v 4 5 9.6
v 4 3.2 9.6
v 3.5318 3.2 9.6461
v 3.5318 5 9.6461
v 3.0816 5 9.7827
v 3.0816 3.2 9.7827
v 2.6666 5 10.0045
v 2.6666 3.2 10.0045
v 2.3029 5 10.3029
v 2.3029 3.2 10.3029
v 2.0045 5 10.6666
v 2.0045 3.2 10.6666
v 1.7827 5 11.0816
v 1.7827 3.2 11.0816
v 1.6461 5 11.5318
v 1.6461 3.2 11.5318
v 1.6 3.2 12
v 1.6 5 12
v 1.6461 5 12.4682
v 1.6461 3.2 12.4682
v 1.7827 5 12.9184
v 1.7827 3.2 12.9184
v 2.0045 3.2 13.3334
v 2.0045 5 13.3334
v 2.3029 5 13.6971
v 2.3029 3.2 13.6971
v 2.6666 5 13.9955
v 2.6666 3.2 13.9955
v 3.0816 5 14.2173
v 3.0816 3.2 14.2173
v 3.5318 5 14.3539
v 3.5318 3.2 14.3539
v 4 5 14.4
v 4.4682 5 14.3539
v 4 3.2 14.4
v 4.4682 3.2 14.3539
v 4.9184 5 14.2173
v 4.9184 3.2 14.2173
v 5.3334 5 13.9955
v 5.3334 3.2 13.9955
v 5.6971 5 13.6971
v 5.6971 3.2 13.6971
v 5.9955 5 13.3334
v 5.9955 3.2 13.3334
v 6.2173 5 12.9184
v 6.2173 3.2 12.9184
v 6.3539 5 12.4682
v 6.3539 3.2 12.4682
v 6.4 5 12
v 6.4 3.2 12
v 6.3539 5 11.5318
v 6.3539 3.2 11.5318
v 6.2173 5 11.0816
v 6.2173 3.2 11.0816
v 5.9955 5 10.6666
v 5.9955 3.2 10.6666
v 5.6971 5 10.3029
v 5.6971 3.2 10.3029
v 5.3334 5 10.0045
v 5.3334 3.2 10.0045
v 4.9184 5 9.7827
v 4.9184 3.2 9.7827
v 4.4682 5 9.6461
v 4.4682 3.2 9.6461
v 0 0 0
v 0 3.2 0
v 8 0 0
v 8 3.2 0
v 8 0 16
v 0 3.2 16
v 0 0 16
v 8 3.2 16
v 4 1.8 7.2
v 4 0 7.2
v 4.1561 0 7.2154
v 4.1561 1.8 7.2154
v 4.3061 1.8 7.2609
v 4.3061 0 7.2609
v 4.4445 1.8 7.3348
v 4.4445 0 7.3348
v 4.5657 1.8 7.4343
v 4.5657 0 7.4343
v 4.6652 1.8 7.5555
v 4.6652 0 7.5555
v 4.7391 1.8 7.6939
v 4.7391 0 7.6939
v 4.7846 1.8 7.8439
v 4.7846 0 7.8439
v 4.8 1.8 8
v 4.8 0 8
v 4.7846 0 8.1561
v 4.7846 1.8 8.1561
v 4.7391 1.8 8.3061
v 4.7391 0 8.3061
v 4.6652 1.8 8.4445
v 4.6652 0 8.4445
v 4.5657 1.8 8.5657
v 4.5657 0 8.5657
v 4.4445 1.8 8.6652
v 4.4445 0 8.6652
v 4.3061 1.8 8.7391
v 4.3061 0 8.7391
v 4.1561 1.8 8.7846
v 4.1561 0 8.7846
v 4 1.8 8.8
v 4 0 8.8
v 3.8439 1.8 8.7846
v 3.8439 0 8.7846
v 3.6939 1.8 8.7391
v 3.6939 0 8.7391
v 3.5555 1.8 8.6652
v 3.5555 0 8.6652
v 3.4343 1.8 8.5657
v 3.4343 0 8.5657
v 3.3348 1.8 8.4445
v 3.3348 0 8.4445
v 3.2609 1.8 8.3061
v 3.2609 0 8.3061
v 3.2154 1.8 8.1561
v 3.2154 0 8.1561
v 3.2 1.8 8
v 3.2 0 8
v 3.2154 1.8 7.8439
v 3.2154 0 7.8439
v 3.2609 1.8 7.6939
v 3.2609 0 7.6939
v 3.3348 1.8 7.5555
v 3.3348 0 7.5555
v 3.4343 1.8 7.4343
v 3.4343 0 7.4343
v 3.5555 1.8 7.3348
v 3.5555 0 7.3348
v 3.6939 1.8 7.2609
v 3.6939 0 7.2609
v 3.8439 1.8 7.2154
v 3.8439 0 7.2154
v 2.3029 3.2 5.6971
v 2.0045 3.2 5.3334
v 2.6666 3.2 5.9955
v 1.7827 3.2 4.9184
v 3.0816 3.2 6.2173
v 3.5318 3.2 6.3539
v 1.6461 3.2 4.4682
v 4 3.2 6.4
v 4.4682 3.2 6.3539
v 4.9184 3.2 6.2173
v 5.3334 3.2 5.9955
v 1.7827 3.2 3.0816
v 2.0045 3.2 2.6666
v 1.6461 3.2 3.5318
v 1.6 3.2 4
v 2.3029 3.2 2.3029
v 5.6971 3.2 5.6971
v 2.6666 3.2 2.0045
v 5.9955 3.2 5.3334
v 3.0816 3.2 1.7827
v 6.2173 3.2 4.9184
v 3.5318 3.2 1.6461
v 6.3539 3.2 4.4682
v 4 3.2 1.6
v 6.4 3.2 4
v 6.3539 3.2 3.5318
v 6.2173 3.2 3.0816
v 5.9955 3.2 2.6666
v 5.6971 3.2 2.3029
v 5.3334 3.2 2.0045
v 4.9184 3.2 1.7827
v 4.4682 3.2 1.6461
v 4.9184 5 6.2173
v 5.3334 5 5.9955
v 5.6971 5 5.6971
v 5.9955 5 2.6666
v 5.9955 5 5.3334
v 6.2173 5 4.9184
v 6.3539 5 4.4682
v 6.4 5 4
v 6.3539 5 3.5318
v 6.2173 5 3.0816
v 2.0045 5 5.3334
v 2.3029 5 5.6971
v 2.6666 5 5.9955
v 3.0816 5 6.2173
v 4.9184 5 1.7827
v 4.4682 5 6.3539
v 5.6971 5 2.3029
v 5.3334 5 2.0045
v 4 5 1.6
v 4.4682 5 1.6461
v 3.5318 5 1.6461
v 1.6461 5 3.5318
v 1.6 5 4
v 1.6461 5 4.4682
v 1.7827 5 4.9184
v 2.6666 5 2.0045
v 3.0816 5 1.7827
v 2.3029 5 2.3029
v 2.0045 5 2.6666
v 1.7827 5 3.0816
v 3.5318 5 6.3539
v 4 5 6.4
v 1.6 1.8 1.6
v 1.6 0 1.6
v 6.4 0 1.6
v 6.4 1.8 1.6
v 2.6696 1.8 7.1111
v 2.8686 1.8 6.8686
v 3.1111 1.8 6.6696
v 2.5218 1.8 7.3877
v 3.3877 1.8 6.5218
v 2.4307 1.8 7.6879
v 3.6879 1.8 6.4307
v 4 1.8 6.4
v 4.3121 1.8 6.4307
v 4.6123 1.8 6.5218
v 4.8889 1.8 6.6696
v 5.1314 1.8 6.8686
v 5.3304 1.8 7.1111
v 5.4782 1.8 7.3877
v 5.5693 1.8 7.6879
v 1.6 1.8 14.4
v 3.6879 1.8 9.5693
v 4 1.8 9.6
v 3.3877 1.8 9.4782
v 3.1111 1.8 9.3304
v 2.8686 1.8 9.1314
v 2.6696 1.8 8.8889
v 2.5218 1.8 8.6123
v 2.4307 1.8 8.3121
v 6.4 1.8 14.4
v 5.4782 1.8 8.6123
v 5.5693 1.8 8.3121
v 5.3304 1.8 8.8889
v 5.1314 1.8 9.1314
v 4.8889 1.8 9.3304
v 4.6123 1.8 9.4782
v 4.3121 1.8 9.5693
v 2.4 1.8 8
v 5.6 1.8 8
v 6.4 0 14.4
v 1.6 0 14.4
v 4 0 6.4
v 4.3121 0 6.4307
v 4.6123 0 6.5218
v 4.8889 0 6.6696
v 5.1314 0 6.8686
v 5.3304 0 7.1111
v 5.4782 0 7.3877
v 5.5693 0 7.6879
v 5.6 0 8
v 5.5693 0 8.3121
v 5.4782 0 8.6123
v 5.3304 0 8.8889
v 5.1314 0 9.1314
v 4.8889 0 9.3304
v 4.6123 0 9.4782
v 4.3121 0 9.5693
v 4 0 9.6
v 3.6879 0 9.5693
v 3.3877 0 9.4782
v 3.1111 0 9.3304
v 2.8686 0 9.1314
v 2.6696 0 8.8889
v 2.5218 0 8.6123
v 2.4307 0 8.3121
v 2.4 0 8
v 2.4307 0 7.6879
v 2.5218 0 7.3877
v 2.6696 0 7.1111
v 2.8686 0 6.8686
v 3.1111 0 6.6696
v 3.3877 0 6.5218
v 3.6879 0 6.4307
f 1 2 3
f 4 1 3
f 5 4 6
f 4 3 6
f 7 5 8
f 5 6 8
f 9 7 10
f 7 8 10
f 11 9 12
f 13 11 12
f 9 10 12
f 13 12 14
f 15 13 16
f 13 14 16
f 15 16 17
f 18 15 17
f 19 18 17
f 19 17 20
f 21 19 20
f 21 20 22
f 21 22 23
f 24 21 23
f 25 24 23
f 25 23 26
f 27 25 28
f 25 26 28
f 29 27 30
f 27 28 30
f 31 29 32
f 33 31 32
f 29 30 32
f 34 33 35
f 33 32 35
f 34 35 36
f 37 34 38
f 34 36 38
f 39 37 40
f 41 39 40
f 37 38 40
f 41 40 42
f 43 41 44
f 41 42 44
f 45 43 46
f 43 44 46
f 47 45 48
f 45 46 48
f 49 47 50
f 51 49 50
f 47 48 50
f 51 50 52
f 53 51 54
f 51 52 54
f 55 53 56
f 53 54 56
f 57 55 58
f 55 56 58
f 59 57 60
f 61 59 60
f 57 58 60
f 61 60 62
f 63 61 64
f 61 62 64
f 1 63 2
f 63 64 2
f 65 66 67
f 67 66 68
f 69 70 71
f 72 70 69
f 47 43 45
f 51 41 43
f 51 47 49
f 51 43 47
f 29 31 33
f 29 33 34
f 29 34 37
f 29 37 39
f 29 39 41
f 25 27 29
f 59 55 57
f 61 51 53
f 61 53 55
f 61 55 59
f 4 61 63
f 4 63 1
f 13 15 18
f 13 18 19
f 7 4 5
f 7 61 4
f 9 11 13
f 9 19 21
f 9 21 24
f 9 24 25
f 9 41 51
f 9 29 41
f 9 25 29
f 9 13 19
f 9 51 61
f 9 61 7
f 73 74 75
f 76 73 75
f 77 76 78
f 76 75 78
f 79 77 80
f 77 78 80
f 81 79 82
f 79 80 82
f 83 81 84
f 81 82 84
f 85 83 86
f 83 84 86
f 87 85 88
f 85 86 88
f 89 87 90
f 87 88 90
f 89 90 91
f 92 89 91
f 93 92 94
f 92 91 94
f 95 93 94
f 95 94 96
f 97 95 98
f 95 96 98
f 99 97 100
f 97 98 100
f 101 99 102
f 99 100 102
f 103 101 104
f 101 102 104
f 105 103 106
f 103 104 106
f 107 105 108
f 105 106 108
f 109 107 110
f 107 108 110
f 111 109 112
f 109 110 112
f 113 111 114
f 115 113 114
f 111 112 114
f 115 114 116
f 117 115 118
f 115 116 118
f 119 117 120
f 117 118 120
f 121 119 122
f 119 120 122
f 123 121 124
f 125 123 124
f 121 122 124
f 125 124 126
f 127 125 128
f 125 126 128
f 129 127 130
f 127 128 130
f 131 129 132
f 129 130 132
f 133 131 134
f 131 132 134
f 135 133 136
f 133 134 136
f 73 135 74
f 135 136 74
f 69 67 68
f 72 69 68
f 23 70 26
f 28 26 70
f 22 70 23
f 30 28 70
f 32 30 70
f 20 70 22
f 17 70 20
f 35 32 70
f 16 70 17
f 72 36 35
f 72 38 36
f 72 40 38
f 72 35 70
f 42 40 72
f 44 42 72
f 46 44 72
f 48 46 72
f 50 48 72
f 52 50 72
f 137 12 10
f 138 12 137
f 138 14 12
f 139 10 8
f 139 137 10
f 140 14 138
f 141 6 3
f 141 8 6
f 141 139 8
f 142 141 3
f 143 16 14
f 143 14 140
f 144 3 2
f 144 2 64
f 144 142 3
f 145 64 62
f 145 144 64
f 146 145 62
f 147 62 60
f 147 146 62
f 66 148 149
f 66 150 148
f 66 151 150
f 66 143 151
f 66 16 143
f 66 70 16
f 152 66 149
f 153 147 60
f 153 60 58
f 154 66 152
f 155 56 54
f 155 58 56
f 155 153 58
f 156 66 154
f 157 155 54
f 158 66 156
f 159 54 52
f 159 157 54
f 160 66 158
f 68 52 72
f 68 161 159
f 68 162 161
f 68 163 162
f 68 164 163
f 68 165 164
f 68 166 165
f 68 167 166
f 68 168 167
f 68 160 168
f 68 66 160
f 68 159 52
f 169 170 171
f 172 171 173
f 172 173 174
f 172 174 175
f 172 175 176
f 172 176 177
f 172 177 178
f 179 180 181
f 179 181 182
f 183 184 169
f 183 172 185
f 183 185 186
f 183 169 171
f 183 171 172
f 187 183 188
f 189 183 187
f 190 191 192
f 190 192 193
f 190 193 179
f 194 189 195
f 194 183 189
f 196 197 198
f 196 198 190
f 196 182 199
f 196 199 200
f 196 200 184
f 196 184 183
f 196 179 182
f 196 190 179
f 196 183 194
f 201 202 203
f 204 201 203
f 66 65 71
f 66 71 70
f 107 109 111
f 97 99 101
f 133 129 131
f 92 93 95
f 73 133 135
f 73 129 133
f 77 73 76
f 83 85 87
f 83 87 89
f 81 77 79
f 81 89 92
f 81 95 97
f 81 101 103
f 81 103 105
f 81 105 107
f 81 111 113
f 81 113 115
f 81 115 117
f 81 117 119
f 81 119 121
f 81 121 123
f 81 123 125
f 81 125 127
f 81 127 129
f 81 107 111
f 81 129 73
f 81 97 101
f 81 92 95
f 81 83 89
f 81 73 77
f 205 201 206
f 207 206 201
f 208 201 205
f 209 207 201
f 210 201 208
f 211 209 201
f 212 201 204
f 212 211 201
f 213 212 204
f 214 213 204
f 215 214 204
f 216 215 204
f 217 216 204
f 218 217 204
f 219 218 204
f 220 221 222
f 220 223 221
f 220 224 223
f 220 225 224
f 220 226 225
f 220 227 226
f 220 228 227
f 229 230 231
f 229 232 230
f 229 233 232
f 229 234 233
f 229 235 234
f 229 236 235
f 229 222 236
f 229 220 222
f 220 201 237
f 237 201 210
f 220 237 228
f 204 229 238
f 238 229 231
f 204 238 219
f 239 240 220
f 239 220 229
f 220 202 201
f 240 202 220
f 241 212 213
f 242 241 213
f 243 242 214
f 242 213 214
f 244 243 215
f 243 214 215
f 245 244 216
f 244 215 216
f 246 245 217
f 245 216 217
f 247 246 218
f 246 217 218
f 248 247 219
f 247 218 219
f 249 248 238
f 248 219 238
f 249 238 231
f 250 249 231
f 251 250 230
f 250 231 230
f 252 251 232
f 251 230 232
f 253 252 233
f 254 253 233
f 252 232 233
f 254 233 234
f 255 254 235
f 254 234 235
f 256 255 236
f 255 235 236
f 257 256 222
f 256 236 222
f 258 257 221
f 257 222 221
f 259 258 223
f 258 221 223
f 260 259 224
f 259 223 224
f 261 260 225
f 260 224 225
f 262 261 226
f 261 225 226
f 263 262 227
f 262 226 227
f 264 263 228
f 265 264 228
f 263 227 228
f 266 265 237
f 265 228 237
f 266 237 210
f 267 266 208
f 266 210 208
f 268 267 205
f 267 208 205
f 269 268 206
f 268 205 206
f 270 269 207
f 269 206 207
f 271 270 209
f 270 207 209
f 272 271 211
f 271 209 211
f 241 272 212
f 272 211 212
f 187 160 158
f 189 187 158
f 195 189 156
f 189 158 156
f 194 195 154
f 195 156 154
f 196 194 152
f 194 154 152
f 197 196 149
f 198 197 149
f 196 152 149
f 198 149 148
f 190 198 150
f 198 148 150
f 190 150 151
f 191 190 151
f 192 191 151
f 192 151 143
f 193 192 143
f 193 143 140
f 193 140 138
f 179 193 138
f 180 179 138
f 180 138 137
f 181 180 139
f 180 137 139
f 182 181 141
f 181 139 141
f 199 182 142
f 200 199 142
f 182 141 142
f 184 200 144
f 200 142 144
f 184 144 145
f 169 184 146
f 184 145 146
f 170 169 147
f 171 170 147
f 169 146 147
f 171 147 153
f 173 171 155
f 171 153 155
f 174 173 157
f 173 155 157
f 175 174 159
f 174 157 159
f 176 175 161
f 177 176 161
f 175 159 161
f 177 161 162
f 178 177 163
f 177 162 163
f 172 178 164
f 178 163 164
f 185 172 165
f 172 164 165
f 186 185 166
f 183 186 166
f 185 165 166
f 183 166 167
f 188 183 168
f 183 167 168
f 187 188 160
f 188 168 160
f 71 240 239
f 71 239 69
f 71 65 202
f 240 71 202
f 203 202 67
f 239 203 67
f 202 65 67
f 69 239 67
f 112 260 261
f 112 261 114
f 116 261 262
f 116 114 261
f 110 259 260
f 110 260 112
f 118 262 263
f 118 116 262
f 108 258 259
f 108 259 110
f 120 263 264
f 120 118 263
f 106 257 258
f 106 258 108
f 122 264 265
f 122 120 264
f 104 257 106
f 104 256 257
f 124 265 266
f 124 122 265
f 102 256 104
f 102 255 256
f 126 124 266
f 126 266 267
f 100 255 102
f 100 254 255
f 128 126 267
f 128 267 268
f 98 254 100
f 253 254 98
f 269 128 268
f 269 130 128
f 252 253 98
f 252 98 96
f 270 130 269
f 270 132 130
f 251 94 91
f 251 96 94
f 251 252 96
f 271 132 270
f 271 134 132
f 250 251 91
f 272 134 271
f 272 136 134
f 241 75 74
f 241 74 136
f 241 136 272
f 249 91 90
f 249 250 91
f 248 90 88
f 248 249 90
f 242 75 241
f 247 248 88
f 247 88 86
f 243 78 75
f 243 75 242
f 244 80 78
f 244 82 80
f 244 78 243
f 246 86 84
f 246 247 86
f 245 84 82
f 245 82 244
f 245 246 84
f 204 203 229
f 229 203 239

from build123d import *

# Parameters (mm, degrees)
SKETCH1_W           = 8
SKETCH1_H           = 3.2
BOSS_EXTRUDE1_DEPTH = 16
SKETCH2_W           = 4.8
SKETCH2_H           = 12.8
CUT_EXTRUDE1_DEPTH  = 1.8
SKETCH3_R           = 2.4
BOSS_EXTRUDE2_DEPTH = 1.8
SKETCH4_R           = 1.6
BOSS_EXTRUDE3_DEPTH = 1.8
SKETCH5_R           = 0.8
CUT_EXTRUDE2_DEPTH  = 1.8


with BuildPart() as part:
    # Sketch1 → Boss-Extrude1 (new body)
    with BuildSketch(Plane.XY):
        with Locations((4, 1.6)):
            Rectangle(SKETCH1_W, SKETCH1_H)
    extrude(amount=BOSS_EXTRUDE1_DEPTH)

    # Sketch2 → Cut-Extrude1 (cut)
    with BuildSketch(Plane.XZ):
        with Locations((4, 8)):
            Rectangle(SKETCH2_W, SKETCH2_H)
    extrude(amount=-CUT_EXTRUDE1_DEPTH, mode=Mode.SUBTRACT)

    # Sketch3 → Boss-Extrude2 (add)
    with BuildSketch(Plane(origin=(0, 3.2, 0), x_dir=(1, 0, 0), z_dir=(0, 1, 0))):
        with Locations((4, -4)):
            Circle(SKETCH3_R)
        with Locations((4, -12)):
            Circle(SKETCH3_R)
    extrude(amount=BOSS_EXTRUDE2_DEPTH)

    # Sketch4 → Boss-Extrude3 (add)
    with BuildSketch(Plane.XZ.offset(-1.8)):
        with Locations((4, 8)):
            Circle(SKETCH4_R)
    extrude(amount=BOSS_EXTRUDE3_DEPTH)

    # Sketch5 → Cut-Extrude2 (cut)
    with BuildSketch(Plane.XZ):
        with Locations((4, 8)):
            Circle(SKETCH5_R)
    extrude(amount=-CUT_EXTRUDE2_DEPTH, mode=Mode.SUBTRACT)


solid = part.part
